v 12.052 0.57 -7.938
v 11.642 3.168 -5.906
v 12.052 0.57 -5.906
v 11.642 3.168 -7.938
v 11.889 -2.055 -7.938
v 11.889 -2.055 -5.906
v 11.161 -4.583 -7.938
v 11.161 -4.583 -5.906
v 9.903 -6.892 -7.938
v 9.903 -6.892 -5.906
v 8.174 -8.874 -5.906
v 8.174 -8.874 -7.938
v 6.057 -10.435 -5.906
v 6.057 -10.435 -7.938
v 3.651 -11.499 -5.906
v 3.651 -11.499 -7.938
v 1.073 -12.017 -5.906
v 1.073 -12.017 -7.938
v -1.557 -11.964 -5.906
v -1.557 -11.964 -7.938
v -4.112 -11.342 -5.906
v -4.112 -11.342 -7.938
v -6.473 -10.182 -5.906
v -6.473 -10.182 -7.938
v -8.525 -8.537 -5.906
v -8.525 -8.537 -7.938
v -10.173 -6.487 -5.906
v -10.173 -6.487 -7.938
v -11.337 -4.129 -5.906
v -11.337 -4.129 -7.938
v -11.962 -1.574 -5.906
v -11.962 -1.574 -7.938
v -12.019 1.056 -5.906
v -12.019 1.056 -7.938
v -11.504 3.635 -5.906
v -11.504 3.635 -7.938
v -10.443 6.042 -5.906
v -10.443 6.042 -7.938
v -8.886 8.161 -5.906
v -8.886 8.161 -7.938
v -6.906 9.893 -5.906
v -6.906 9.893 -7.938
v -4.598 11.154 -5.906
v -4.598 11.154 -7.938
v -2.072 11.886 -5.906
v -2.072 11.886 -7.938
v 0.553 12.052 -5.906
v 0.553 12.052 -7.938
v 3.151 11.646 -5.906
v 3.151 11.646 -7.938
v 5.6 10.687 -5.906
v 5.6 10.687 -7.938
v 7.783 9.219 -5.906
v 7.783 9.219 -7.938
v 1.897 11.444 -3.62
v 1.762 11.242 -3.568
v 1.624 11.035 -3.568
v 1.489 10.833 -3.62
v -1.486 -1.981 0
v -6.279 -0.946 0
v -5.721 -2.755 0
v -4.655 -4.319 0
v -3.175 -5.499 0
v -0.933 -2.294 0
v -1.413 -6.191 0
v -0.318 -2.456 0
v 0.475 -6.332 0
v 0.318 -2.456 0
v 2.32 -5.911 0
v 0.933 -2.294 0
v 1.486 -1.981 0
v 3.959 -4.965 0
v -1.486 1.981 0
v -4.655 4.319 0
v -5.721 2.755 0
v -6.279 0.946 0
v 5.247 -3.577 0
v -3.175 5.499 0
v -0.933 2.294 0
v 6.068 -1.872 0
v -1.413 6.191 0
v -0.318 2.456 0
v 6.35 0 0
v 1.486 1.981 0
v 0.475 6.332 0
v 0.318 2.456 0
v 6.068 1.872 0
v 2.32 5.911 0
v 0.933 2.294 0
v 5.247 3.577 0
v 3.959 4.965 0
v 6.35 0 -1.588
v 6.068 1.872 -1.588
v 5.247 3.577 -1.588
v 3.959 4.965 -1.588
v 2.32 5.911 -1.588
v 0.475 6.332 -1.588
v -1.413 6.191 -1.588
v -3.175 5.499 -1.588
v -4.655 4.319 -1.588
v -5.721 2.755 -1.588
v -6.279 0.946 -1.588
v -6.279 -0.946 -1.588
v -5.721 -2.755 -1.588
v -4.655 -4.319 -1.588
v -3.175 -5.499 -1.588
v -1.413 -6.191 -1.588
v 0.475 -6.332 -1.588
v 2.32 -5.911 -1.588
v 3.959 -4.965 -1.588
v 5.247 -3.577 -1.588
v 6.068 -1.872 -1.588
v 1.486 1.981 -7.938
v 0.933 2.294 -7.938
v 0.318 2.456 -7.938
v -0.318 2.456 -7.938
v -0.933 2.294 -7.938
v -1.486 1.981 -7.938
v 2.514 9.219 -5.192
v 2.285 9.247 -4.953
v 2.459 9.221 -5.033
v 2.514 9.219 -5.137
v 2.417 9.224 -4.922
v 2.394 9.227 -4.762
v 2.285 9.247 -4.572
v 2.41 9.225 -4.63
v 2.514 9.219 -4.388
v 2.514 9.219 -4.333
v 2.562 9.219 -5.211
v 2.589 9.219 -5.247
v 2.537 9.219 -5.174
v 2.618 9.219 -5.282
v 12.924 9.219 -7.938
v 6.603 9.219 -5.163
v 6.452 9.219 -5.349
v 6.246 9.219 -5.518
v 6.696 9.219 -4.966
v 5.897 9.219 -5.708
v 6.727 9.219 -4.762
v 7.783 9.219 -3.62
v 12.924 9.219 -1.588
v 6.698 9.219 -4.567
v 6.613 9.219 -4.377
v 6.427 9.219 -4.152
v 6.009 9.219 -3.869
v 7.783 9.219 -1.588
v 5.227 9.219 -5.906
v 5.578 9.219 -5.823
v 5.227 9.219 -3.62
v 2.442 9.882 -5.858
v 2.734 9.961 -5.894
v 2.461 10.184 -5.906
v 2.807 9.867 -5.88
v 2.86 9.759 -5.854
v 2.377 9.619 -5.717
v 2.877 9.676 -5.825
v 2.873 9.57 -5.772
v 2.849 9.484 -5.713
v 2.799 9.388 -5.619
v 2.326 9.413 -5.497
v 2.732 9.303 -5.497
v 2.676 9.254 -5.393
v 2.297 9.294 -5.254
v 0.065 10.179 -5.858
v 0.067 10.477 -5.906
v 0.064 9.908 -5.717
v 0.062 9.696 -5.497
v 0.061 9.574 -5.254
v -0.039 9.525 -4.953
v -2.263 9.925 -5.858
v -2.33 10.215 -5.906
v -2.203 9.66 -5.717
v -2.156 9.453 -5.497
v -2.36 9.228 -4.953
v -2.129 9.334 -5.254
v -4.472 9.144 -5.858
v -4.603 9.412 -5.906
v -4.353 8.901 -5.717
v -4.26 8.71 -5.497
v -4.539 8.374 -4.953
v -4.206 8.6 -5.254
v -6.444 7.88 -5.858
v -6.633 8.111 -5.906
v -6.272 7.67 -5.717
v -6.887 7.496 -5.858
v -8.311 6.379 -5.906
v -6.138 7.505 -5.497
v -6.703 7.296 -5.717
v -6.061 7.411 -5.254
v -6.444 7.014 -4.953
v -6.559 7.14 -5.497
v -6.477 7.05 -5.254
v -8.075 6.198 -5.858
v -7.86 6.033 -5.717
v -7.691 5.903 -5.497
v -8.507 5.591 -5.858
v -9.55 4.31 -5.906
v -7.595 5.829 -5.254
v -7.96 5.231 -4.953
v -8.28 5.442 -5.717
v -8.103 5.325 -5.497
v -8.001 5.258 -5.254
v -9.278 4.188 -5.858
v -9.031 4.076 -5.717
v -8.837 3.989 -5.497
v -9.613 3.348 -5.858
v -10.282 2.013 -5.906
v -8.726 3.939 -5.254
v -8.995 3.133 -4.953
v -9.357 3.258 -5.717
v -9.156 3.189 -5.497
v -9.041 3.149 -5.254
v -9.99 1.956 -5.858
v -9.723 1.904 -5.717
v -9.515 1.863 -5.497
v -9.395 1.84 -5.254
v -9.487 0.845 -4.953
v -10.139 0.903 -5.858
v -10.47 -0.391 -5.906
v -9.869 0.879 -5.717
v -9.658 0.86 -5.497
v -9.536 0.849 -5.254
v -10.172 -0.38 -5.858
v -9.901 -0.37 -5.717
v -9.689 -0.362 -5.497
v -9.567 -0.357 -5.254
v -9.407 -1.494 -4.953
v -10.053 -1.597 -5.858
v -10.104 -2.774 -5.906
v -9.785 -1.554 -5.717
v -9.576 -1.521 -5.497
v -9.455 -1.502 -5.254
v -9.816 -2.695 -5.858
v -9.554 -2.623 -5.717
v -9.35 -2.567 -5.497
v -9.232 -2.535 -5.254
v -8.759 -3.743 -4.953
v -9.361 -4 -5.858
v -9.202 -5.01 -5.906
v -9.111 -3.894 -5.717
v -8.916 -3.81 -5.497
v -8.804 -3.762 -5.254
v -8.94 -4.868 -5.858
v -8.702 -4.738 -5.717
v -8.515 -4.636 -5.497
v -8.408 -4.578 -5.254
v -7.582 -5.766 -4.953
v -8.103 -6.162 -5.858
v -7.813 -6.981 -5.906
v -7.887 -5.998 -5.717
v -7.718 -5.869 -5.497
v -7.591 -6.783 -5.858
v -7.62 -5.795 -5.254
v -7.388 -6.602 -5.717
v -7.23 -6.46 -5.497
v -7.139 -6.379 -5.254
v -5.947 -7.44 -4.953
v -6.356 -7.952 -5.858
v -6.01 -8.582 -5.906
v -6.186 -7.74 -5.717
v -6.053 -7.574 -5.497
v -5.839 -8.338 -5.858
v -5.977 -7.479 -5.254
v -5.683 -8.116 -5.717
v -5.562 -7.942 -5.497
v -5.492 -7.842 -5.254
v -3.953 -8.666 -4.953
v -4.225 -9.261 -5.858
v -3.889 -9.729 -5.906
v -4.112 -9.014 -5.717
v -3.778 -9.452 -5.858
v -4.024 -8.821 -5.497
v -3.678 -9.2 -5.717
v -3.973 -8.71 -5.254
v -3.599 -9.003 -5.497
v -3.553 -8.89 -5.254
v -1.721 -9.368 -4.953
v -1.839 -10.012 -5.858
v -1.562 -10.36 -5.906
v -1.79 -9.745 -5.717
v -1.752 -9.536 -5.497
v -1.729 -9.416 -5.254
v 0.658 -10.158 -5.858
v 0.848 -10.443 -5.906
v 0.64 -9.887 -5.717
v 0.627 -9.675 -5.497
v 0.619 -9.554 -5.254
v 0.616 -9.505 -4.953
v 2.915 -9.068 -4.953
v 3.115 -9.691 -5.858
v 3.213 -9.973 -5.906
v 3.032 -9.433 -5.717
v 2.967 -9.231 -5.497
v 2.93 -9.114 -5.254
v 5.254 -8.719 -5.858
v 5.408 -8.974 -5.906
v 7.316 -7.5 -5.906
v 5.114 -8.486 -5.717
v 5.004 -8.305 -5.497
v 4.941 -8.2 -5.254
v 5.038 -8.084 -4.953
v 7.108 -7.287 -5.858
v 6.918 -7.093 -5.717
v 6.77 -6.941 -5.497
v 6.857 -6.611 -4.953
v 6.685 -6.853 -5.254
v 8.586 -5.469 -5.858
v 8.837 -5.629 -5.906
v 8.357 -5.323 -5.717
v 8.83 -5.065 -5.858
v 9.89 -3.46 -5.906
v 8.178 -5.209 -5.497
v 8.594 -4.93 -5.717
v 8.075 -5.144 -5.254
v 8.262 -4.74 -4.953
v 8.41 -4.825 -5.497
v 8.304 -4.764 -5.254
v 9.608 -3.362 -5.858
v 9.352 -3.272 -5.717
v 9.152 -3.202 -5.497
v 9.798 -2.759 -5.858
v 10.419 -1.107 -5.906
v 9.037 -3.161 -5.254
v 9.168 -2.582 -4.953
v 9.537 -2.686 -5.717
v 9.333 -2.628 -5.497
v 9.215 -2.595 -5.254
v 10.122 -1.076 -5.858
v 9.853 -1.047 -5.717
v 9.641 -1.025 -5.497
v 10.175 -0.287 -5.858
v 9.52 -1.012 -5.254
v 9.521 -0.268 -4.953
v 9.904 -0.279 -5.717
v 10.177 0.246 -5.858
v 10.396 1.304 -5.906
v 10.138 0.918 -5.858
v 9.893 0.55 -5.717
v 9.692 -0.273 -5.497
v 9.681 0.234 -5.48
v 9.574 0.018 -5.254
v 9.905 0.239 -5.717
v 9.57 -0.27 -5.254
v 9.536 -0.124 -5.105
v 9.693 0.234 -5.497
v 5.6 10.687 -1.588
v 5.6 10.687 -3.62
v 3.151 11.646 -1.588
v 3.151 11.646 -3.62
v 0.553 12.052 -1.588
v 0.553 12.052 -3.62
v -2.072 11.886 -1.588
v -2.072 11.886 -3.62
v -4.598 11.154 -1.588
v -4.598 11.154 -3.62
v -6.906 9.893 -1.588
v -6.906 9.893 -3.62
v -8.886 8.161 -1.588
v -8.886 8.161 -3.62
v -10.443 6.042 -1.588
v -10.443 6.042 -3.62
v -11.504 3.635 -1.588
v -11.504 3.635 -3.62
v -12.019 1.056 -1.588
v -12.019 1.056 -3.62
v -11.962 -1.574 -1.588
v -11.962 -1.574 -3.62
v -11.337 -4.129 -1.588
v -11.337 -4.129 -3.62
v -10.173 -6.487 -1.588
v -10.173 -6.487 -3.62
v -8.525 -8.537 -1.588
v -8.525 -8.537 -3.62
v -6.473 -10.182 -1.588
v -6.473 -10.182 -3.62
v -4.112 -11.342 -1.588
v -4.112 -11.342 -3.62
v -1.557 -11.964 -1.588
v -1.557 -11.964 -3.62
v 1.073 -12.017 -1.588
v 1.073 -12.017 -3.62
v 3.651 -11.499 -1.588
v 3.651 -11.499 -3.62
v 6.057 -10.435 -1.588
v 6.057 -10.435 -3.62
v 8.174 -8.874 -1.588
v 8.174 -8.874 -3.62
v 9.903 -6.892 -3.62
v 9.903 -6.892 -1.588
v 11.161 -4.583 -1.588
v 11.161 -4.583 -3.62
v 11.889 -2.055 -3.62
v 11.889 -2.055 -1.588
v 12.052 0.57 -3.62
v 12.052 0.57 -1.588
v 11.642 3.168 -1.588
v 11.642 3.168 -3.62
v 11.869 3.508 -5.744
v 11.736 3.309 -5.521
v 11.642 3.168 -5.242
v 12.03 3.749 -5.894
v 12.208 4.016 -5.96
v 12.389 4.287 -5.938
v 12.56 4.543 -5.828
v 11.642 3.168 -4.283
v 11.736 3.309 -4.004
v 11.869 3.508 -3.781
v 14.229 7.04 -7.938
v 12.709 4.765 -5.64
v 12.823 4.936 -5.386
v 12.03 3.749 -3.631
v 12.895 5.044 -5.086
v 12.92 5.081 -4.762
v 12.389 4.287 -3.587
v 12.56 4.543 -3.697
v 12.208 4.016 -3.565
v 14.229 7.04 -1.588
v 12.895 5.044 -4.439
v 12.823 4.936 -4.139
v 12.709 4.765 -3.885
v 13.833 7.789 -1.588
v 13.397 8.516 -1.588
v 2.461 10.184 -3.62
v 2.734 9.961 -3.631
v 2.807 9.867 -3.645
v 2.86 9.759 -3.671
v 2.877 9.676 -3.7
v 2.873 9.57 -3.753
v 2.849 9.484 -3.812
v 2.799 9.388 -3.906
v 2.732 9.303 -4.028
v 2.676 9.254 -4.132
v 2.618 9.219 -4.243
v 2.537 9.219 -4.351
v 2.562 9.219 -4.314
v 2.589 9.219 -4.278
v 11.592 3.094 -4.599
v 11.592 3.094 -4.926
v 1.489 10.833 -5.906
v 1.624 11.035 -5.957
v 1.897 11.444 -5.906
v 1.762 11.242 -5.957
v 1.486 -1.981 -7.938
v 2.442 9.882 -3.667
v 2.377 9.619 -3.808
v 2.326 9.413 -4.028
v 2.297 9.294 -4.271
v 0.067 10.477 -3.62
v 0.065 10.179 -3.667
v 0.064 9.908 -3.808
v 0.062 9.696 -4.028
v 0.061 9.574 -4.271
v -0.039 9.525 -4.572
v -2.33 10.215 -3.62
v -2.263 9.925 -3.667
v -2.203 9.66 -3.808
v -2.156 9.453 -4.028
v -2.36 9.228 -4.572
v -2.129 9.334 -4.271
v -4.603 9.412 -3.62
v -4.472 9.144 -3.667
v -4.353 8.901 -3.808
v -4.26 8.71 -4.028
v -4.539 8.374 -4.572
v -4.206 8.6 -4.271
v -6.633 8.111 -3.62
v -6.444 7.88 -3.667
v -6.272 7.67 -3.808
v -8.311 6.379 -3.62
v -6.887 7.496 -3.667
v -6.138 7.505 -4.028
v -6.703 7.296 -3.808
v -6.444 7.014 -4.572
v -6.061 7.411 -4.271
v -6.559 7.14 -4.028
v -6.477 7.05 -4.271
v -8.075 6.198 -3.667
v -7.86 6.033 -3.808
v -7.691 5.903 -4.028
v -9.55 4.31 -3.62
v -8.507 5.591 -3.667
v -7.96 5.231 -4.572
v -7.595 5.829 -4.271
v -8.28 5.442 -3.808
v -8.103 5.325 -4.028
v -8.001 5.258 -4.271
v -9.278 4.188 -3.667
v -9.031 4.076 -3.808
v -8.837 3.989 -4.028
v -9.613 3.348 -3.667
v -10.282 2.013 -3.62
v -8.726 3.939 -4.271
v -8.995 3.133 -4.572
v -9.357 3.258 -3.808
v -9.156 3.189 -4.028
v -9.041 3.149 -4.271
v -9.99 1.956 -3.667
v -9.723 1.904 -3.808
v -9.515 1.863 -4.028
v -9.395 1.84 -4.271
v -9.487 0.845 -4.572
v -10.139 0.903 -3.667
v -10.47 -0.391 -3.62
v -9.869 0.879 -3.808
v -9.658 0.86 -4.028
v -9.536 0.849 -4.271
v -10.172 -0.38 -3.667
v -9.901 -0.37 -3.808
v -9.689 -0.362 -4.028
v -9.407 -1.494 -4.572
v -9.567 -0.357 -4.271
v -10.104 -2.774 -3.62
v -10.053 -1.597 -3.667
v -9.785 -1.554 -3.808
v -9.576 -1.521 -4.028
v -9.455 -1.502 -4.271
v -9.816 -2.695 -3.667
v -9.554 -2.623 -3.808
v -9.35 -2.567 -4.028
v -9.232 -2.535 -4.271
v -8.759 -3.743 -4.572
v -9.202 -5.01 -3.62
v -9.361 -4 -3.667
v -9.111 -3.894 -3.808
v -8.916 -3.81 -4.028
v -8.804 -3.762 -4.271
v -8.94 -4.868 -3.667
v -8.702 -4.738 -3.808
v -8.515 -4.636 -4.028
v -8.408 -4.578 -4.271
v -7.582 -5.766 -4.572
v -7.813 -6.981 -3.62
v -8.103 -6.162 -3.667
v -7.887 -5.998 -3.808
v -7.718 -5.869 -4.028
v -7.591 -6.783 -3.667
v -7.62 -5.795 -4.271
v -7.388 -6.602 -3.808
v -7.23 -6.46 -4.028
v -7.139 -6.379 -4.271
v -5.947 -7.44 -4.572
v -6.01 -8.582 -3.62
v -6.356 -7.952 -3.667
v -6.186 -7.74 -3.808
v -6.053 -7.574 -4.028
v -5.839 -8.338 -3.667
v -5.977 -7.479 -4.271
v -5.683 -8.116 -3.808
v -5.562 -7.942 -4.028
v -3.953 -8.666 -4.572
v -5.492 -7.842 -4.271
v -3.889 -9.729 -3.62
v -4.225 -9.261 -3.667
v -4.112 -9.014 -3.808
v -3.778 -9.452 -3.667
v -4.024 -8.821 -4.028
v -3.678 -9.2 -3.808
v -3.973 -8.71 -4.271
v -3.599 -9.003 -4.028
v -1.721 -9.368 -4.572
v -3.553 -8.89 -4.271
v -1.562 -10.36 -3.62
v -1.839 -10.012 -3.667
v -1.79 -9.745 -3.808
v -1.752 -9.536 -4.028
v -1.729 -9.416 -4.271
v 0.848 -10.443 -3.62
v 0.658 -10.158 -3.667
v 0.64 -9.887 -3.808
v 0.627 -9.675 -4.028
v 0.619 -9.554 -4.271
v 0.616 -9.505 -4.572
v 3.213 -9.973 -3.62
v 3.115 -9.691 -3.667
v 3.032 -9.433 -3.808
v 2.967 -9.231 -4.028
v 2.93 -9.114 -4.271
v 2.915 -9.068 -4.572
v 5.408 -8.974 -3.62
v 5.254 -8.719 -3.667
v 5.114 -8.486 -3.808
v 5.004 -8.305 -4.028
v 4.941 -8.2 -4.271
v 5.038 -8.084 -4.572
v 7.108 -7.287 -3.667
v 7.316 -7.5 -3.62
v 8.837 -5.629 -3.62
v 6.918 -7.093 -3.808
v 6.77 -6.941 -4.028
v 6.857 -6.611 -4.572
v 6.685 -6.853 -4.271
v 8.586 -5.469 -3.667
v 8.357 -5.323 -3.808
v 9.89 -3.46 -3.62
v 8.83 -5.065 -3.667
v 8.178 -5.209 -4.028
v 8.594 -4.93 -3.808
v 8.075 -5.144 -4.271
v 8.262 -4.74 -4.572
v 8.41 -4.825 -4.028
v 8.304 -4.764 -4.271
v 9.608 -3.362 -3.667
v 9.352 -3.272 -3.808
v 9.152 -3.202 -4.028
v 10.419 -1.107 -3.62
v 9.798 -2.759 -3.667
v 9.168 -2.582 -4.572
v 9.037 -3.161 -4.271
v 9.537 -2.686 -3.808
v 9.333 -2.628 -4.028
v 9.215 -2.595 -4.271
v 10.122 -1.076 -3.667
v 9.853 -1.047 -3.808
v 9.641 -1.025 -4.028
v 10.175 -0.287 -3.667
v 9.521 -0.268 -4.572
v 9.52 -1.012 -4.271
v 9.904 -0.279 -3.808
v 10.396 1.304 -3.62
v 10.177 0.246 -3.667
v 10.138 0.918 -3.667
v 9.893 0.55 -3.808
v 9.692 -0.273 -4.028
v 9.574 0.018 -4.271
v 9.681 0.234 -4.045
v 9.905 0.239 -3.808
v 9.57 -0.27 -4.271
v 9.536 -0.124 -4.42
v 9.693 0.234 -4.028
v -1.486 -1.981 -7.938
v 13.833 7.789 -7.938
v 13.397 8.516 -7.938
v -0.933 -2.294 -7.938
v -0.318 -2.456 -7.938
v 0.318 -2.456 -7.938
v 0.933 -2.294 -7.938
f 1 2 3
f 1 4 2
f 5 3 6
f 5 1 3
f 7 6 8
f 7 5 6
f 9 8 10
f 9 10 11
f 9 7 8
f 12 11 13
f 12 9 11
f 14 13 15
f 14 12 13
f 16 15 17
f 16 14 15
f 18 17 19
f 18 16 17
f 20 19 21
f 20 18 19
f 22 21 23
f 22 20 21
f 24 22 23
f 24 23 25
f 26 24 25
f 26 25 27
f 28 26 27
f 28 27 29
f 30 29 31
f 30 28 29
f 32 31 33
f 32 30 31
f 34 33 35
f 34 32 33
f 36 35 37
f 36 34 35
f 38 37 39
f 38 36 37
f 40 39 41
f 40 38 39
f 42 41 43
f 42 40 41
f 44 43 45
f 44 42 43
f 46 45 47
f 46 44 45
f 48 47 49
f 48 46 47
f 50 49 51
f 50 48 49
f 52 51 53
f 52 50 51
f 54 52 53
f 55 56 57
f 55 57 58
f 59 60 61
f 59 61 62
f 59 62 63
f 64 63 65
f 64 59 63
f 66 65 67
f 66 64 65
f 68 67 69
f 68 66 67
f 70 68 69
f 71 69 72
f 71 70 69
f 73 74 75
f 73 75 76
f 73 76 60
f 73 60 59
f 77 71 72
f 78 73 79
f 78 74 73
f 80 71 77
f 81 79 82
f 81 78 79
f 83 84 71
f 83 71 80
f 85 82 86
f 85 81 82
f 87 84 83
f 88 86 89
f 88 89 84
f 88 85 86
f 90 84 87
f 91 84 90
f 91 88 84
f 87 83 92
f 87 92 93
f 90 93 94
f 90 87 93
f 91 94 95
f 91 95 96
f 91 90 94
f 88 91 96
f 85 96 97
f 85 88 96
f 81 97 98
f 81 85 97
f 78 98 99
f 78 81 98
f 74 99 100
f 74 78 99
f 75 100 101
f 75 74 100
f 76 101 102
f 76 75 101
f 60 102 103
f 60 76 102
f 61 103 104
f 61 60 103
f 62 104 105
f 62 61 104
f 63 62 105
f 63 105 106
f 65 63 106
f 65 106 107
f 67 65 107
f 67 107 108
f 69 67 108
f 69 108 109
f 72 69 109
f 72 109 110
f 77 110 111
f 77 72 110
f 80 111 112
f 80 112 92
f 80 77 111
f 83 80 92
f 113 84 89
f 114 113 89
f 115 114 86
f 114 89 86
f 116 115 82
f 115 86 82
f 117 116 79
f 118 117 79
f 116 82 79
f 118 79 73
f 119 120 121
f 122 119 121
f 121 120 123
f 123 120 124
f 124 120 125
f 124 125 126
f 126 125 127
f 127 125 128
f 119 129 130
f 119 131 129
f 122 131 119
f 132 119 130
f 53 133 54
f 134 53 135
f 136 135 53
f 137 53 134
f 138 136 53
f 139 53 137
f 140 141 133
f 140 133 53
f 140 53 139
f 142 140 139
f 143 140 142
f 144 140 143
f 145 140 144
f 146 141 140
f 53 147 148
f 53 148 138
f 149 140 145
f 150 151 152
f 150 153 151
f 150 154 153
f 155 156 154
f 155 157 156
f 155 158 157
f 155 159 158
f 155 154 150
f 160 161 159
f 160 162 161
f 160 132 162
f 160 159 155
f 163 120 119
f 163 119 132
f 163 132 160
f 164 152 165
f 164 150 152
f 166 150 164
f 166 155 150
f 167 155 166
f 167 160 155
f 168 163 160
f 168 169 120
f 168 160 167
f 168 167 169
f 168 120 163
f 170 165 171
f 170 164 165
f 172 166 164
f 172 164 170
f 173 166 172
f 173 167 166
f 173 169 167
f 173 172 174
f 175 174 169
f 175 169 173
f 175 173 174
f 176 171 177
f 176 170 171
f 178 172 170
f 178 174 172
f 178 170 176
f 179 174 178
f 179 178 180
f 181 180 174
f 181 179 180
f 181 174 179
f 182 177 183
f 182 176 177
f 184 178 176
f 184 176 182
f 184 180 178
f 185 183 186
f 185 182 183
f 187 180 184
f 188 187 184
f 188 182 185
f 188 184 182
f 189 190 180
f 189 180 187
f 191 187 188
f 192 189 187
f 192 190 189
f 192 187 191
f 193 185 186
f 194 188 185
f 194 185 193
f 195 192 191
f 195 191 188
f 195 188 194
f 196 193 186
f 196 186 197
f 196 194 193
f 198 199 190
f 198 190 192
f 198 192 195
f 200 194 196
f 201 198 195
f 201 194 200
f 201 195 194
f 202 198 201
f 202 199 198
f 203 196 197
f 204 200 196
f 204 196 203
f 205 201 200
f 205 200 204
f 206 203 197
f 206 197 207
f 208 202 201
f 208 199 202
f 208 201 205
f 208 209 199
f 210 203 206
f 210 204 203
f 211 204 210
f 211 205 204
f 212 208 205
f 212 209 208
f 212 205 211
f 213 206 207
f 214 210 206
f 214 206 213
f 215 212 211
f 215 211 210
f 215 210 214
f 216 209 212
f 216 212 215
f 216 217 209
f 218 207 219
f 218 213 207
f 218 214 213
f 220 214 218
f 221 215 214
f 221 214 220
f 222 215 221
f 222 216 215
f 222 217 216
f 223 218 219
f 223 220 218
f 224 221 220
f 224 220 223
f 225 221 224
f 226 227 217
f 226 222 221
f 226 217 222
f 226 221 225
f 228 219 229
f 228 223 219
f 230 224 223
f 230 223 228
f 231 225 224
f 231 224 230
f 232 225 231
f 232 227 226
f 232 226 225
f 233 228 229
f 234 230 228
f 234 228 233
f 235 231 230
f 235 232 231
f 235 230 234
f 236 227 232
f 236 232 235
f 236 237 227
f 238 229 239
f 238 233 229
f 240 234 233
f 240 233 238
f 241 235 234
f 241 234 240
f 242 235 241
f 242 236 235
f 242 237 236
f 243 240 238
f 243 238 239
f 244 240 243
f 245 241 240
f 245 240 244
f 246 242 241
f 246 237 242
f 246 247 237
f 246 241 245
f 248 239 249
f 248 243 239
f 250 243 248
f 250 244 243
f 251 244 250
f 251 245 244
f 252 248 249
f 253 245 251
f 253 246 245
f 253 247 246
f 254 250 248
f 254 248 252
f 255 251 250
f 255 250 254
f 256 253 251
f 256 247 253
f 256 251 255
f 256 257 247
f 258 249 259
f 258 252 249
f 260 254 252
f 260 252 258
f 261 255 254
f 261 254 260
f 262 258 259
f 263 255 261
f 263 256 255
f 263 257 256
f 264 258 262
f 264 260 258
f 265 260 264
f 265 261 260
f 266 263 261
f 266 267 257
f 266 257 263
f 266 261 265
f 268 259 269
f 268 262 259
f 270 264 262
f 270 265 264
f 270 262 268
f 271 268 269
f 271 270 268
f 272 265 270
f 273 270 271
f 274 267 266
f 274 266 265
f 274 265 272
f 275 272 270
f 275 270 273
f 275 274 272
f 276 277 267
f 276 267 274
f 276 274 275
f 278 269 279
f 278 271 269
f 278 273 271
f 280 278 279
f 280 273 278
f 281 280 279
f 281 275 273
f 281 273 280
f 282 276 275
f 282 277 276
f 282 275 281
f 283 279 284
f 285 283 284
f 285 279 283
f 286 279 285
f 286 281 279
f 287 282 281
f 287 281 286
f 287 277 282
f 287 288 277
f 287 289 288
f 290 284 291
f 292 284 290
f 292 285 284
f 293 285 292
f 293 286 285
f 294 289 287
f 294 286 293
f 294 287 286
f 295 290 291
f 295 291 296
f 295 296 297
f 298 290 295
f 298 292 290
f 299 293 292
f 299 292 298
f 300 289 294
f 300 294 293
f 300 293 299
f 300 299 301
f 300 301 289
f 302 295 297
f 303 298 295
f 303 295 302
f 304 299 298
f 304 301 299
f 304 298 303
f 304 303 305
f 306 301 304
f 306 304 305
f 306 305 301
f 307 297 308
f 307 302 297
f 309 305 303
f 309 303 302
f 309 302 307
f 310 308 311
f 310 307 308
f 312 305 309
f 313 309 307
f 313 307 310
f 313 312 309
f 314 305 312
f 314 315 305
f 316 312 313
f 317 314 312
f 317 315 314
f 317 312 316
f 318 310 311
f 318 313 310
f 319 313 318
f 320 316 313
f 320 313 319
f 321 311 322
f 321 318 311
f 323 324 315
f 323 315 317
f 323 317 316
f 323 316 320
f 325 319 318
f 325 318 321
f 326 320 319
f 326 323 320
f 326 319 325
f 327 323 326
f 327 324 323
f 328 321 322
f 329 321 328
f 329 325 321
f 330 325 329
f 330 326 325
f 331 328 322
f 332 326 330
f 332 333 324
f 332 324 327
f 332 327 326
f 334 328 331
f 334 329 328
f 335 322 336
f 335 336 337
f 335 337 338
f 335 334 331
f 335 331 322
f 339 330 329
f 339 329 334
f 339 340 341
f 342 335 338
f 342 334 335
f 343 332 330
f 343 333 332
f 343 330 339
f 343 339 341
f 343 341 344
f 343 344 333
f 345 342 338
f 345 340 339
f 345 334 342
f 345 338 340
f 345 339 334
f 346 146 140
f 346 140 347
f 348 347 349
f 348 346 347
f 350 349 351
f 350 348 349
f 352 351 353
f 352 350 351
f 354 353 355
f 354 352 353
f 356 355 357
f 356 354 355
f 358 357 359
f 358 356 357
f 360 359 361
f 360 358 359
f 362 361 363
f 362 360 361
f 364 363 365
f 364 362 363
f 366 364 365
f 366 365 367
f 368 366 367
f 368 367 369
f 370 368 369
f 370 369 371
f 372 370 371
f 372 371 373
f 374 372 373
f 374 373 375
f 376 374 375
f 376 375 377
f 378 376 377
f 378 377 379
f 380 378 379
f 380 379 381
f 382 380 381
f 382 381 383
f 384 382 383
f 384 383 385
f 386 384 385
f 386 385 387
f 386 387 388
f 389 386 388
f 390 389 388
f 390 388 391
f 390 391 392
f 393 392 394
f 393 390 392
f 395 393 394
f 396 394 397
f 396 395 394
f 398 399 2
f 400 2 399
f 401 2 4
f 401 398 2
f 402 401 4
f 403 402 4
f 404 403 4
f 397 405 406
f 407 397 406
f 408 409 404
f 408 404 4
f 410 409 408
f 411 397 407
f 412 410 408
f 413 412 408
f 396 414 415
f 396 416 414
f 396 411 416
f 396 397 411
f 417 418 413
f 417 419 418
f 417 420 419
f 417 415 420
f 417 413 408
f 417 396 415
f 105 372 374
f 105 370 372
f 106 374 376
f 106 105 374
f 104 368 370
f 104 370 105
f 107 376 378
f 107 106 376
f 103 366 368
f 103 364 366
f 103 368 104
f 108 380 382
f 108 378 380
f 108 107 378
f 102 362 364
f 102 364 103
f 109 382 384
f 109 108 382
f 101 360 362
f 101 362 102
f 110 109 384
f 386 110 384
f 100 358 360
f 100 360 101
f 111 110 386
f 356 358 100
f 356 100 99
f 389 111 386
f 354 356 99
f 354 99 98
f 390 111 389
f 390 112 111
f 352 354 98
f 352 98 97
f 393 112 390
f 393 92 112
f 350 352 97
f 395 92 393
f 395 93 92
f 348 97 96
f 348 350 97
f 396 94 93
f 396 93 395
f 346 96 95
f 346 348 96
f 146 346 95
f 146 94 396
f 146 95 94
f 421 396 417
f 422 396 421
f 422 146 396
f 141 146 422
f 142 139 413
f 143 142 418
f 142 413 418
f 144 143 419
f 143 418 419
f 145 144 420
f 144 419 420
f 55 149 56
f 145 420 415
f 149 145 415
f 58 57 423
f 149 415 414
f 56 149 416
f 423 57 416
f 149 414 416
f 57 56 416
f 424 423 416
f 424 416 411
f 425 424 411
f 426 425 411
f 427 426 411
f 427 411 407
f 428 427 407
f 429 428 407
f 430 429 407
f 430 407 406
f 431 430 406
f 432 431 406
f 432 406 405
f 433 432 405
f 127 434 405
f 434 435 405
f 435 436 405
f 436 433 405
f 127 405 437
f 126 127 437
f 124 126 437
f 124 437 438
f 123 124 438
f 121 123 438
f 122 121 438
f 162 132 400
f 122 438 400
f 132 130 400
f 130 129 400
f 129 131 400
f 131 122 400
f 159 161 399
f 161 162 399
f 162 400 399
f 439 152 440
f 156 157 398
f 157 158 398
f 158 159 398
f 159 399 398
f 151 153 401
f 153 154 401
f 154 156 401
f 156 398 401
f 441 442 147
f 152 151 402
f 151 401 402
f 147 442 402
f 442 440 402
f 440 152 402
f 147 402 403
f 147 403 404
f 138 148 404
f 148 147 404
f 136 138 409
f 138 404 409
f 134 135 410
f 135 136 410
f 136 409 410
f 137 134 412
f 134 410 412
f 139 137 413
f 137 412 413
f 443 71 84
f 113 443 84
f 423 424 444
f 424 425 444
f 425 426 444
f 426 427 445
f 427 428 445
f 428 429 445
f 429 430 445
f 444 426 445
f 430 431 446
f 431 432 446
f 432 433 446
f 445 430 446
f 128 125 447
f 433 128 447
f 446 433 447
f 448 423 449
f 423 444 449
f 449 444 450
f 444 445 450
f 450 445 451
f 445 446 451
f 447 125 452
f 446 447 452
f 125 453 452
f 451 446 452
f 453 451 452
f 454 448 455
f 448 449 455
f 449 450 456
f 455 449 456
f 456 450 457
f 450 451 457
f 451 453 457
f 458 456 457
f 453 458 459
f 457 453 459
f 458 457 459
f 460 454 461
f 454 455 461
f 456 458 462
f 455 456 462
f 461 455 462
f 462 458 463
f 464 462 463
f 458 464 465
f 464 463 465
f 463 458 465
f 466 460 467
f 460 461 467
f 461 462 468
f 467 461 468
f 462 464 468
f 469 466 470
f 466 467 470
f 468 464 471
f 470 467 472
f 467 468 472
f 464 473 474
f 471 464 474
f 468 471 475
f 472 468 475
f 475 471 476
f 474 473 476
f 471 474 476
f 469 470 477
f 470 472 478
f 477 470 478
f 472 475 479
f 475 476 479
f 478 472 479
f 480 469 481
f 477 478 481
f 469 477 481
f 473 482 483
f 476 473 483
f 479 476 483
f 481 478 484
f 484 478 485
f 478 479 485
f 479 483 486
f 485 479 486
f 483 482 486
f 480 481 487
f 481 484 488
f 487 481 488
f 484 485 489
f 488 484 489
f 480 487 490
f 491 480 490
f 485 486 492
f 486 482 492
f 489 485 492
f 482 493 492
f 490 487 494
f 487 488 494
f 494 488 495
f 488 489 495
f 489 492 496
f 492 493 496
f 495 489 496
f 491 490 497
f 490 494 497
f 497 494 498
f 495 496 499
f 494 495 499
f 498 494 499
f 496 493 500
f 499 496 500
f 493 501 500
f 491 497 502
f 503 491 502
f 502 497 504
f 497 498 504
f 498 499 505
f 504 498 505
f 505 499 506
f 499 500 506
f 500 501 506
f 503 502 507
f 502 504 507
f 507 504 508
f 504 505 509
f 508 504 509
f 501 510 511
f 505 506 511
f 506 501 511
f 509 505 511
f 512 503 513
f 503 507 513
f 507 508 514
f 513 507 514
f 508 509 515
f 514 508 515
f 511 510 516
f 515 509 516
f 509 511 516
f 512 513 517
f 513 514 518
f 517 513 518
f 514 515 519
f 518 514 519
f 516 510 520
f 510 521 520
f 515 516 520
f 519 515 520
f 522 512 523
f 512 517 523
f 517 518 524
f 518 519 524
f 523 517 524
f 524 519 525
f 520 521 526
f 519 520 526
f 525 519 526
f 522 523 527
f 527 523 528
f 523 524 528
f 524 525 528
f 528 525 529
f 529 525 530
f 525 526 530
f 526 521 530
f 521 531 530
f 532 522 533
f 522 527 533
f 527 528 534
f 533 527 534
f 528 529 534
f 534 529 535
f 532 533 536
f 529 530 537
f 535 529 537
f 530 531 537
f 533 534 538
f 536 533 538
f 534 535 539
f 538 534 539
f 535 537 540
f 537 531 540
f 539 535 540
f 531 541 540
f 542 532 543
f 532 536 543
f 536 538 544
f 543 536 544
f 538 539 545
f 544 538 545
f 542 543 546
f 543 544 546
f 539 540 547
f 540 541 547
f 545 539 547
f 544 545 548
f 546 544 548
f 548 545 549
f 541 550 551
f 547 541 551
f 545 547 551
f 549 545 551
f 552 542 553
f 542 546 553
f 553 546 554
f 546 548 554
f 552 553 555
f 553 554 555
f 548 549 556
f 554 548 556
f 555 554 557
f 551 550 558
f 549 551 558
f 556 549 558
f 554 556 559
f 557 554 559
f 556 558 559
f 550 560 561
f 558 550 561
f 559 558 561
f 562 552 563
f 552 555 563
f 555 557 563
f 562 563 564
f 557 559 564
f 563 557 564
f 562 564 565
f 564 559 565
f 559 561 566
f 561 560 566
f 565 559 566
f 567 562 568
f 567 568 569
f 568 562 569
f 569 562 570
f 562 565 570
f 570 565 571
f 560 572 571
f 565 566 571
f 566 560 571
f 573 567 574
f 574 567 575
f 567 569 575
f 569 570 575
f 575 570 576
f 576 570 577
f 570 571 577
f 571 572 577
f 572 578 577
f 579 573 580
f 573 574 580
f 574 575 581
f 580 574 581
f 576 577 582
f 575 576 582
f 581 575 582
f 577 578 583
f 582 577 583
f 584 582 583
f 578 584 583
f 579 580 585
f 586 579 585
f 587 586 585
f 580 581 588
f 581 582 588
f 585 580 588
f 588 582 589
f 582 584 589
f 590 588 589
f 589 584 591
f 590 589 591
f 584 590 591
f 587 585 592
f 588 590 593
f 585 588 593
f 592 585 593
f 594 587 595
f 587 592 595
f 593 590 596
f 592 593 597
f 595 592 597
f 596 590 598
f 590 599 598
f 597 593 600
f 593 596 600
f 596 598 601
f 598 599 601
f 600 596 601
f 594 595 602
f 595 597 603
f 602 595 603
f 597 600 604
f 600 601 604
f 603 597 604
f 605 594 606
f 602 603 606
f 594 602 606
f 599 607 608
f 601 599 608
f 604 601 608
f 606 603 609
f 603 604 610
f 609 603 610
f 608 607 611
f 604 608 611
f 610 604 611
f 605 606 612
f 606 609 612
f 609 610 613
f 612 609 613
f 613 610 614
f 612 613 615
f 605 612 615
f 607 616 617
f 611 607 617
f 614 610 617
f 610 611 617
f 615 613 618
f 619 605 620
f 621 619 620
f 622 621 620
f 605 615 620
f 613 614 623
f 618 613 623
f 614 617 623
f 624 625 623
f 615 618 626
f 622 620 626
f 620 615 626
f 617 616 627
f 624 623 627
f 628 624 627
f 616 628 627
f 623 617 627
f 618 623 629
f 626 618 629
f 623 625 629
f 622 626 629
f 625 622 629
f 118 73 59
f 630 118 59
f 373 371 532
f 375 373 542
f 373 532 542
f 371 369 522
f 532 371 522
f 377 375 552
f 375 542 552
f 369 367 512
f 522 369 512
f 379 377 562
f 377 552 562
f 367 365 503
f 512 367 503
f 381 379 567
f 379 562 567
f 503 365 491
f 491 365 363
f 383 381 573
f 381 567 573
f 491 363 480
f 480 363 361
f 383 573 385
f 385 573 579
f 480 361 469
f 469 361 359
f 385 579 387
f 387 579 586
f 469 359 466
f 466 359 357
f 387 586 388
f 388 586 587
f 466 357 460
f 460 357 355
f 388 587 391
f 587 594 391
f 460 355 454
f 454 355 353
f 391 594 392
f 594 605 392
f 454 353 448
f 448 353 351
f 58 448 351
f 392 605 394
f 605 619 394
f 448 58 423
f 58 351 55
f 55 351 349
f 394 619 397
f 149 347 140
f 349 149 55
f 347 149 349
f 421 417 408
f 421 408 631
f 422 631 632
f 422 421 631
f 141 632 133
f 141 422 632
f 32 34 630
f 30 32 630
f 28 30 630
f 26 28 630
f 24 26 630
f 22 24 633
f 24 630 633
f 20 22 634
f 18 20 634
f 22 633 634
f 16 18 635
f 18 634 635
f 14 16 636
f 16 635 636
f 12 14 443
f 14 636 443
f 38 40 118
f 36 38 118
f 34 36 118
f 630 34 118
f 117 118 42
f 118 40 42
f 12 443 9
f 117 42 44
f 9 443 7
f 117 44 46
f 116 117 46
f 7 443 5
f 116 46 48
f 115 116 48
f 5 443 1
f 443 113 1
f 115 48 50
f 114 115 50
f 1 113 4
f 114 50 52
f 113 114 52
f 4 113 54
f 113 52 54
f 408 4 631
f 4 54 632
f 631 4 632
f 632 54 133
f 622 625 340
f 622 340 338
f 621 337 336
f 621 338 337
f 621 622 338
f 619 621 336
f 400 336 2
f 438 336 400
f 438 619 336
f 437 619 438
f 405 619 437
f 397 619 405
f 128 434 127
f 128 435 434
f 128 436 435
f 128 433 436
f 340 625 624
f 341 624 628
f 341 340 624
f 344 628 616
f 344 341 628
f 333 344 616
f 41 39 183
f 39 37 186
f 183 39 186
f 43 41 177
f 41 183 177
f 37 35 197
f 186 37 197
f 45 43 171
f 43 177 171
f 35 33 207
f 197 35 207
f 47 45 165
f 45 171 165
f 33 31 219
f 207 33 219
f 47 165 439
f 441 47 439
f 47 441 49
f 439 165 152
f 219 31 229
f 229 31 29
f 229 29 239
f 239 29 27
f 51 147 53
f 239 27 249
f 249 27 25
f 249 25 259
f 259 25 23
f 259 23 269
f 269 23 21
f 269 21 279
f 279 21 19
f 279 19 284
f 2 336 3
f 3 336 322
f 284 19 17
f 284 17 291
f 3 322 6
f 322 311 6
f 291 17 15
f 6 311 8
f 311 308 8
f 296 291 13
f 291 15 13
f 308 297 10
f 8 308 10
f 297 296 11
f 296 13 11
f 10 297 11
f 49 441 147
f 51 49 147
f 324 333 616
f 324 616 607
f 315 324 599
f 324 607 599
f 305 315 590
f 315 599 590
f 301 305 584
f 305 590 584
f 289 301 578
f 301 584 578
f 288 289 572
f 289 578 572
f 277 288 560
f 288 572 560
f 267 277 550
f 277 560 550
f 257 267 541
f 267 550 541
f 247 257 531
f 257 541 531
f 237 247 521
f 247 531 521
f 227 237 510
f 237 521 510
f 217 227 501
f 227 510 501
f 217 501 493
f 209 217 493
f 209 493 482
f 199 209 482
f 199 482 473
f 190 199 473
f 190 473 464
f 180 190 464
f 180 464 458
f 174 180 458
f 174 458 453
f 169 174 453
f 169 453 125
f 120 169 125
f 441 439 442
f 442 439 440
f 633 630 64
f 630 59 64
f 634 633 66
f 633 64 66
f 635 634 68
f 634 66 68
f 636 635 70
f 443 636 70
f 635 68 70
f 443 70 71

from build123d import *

# Parameters (mm, degrees)
F0_R          = 6.35
F1_DEPTH      = 1.5875
F2_R          = 9.525
F2_R_2        = 6.35
F3_DEPTH      = 6.35
F4_R          = 12.065
F4_R_2        = 9.525
F5_DEPTH      = 2.032
F6_R          = 12.065
F6_R_2        = 6.35
F7_DEPTH      = 2.032
F9_DEPTH      = 6.35
F10_R         = 1.2005117183
F11_DEPTH     = 12.7
F12_T1_DEPTH  = 3.6932202738
F12_T6_ANGLE  = 313.32464119
F12_S7_R      = 1.2005117183
F12_T8_DEPTH  = 18
F12_T12_DEPTH = 2.8797396175
F12_S13_R     = 1.2005117183
F12_T14_DEPTH = 3
F12_T18_ANGLE = 313.32464119
F12_S19_R     = 1.2005117183
F12_T20_DEPTH = 18


# Not quite as in the source:
# - a fillet or chamfer that OpenCascade refuses, or shapes differently, is made with other operations: its cross-section is extruded or revolved along the edge and cut away or added


with BuildPart() as f1:
    # F0 (on Top) → F1 (new body)
    with BuildSketch(Plane.XY):
        Circle(F0_R)
        with BuildLine():
            ThreePointArc((1.4859, -1.9812), (0, -2.4765), (-1.4859, -1.9812))
            Line((-1.4859, -1.9812), (-1.4859, 1.9812))
            ThreePointArc((-1.4859, 1.9812), (0, 2.4765), (1.4859, 1.9812))
            Line((1.4859, 1.9812), (1.4859, -1.9812))
        make_face(mode=Mode.SUBTRACT)
    extrude(amount=-F1_DEPTH)

    # F2 (on face) → F3 (join)
    with BuildSketch(Plane(origin=(0, 0, -1.5875), x_dir=(1, 0, 0), z_dir=(0, 0, -1))):
        Circle(F2_R)
        Circle(F2_R_2, mode=Mode.SUBTRACT)
        Circle(F2_R_2)
        with BuildLine():
            ThreePointArc((-1.4859, 1.9812), (0, 2.4765), (1.4859, 1.9812))
            Line((1.4859, 1.9812), (1.4859, -1.9812))
            ThreePointArc((1.4859, -1.9812), (0, -2.4765), (-1.4859, -1.9812))
            Line((-1.4859, -1.9812), (-1.4859, 1.9812))
        make_face(mode=Mode.SUBTRACT)
    extrude(amount=F3_DEPTH)

    # F4 (on face) → F5 (join)
    with BuildSketch(Plane.XY.offset(-1.5875)):
        Circle(F4_R)
        Circle(F4_R_2, mode=Mode.SUBTRACT)
    extrude(amount=-F5_DEPTH)

    # F6 (on face) → F7 (join)
    with BuildSketch(Plane(origin=(0, 0, -7.9375), x_dir=(1, 0, 0), z_dir=(0, 0, -1))):
        Circle(F6_R)
        Circle(F6_R_2, mode=Mode.SUBTRACT)
    extrude(amount=-F7_DEPTH)

    # F8 (on face) → F9 (join)
    with BuildSketch(Plane.XY.offset(-1.5875)):
        with BuildLine():
            ThreePointArc((7.7828940639, 9.2190446897), (10.1726283334, 6.4870530898), (11.6416666667, 3.1679365875))
            Line((11.6416666667, 3.1679365875), (14.2287037037, 7.0398590833))
            ThreePointArc((14.2287037037, 7.0398590833), (13.6199100402, 8.1555916706), (12.9238090364, 9.2190446897))
            Line((12.9238090364, 9.2190446897), (7.7828940639, 9.2190446897))
        make_face()
        with BuildLine():
            ThreePointArc((2.3947525988, 9.2190446897), (7.534442365, 5.8273324299), (9.525, 0))
            Line((9.525, 0), (11.6416666667, 3.1679365875))
            ThreePointArc((11.6416666667, 3.1679365875), (10.1726283334, 6.4870530898), (7.7828940639, 9.2190446897))
            Line((7.7828940639, 9.2190446897), (2.3947525988, 9.2190446897))
        make_face()
    extrude(amount=-F9_DEPTH)

    # F10 (on face) → F11 (cut)
    with BuildSketch(Plane(origin=(6.5851851852, -4.399911927, 0), x_dir=(0.5555555556, 0.8314794193, 0), z_dir=(0.8314794193, -0.5555555556, 0))):
        with Locations((10.2023333333, -4.7625)):
            Circle(F10_R)
    extrude(amount=-F11_DEPTH, mode=Mode.SUBTRACT)

    # F12: fillet of radius 0.9525 on 4 edges, made by hand

    # F12_s2 → F12_t1 (join)
    with BuildSketch(Plane.XY.offset(-6.6091101369)):
        with BuildLine():
            ThreePointArc((9.6813578082, 0.2340149392), (9.5658390102, -0.0058514421), (9.5212199592, -0.2683197522))
            ThreePointArc((9.5212199592, -0.2683197522), (9.5240549429, -0.1341731886), (9.525, 0))
            Line((9.525, 0), (9.6813578082, 0.2340149392))
        make_face()
    extrude(amount=F12_T1_DEPTH)


with BuildPart() as f12_tool4:
    # F12_s5 → F12_t6 (revolve)
    with BuildSketch(Plane(origin=(0, 0, 0), x_dir=(0, 0, 1), z_dir=(0.8751013478, -0.4839396977, 0))):
        with BuildLine():
            ThreePointArc((-3.6195, -10.4775), (-3.8984807909, -9.8039807909), (-4.572, -9.525))
            Line((-4.572, -9.525), (-3.6195, -9.525))
            Line((-3.6195, -9.525), (-3.6195, -10.4775))
        make_face()
    revolve(axis=Axis((0, 0, -3.6195), (0, 0, 1)), revolution_arc=F12_T6_ANGLE)

    # F12_s7 → F12_t8 (cut, symmetric)
    with BuildSketch(Plane(origin=(0, 0, 0), x_dir=(0, 0, 1), z_dir=(0.8314794193, -0.5555555556, 0))):
        with Locations((-4.7625, -10.2023333333)):
            Circle(F12_S7_R)
    extrude(amount=F12_T8_DEPTH, both=True, mode=Mode.SUBTRACT)


with BuildPart() as f1_1:
    add(f1.part)

    # F12_t3: union F12_tool4
    add(f12_tool4.part)


with BuildPart() as f12_tool10:
    # F12_s11 → F12_t12 (new body)
    with BuildSketch(Plane.XY.offset(-3.3226301913)):
        with BuildLine():
            ThreePointArc((2.2850004748, 9.2468588088), (2.398407194, 9.2260237879), (2.5135005223, 9.2190446897))
            Line((2.5135005223, 9.2190446897), (2.3947525988, 9.2190446897))
            ThreePointArc((2.3947525988, 9.2190446897), (2.3399178648, 9.2331148258), (2.2850004748, 9.2468588088))
        make_face()
    extrude(amount=-F12_T12_DEPTH)

    # F12_s13 → F12_t14 (cut, symmetric)
    with BuildSketch(Plane(origin=(-2.5775861998, 1.7222222222, 0), x_dir=(0, 0, 1), z_dir=(0.8314794193, -0.5555555556, 0))):
        with Locations((-4.7625, -10.2023333333)):
            Circle(F12_S13_R)
    extrude(amount=F12_T14_DEPTH, both=True, mode=Mode.SUBTRACT)


with BuildPart() as f1_2:
    add(f1_1.part)

    # F12_t9: union F12_tool10
    add(f12_tool10.part)


with BuildPart() as f12_tool16:
    # F12_s17 → F12_t18 (revolve)
    with BuildSketch(Plane(origin=(0, 0, 0), x_dir=(0, 0, 1), z_dir=(0.8751013478, -0.4839396977, 0))):
        with BuildLine():
            ThreePointArc((-5.9055, -10.4775), (-5.6265192091, -9.8039807909), (-4.953, -9.525))
            Line((-4.953, -9.525), (-5.9055, -9.525))
            Line((-5.9055, -9.525), (-5.9055, -10.4775))
        make_face()
    revolve(axis=Axis((0, 0, -5.9055), (0, 0, 1)), revolution_arc=F12_T18_ANGLE)

    # F12_s19 → F12_t20 (cut, symmetric)
    with BuildSketch(Plane(origin=(0, 0, 0), x_dir=(0, 0, 1), z_dir=(0.8314794193, -0.5555555556, 0))):
        with Locations((-4.7625, -10.2023333333)):
            Circle(F12_S19_R)
    extrude(amount=F12_T20_DEPTH, both=True, mode=Mode.SUBTRACT)


with BuildPart() as f1_3:
    add(f1_2.part)

    # F12_t15: union F12_tool16
    add(f12_tool16.part)


solid = f1_3.part
